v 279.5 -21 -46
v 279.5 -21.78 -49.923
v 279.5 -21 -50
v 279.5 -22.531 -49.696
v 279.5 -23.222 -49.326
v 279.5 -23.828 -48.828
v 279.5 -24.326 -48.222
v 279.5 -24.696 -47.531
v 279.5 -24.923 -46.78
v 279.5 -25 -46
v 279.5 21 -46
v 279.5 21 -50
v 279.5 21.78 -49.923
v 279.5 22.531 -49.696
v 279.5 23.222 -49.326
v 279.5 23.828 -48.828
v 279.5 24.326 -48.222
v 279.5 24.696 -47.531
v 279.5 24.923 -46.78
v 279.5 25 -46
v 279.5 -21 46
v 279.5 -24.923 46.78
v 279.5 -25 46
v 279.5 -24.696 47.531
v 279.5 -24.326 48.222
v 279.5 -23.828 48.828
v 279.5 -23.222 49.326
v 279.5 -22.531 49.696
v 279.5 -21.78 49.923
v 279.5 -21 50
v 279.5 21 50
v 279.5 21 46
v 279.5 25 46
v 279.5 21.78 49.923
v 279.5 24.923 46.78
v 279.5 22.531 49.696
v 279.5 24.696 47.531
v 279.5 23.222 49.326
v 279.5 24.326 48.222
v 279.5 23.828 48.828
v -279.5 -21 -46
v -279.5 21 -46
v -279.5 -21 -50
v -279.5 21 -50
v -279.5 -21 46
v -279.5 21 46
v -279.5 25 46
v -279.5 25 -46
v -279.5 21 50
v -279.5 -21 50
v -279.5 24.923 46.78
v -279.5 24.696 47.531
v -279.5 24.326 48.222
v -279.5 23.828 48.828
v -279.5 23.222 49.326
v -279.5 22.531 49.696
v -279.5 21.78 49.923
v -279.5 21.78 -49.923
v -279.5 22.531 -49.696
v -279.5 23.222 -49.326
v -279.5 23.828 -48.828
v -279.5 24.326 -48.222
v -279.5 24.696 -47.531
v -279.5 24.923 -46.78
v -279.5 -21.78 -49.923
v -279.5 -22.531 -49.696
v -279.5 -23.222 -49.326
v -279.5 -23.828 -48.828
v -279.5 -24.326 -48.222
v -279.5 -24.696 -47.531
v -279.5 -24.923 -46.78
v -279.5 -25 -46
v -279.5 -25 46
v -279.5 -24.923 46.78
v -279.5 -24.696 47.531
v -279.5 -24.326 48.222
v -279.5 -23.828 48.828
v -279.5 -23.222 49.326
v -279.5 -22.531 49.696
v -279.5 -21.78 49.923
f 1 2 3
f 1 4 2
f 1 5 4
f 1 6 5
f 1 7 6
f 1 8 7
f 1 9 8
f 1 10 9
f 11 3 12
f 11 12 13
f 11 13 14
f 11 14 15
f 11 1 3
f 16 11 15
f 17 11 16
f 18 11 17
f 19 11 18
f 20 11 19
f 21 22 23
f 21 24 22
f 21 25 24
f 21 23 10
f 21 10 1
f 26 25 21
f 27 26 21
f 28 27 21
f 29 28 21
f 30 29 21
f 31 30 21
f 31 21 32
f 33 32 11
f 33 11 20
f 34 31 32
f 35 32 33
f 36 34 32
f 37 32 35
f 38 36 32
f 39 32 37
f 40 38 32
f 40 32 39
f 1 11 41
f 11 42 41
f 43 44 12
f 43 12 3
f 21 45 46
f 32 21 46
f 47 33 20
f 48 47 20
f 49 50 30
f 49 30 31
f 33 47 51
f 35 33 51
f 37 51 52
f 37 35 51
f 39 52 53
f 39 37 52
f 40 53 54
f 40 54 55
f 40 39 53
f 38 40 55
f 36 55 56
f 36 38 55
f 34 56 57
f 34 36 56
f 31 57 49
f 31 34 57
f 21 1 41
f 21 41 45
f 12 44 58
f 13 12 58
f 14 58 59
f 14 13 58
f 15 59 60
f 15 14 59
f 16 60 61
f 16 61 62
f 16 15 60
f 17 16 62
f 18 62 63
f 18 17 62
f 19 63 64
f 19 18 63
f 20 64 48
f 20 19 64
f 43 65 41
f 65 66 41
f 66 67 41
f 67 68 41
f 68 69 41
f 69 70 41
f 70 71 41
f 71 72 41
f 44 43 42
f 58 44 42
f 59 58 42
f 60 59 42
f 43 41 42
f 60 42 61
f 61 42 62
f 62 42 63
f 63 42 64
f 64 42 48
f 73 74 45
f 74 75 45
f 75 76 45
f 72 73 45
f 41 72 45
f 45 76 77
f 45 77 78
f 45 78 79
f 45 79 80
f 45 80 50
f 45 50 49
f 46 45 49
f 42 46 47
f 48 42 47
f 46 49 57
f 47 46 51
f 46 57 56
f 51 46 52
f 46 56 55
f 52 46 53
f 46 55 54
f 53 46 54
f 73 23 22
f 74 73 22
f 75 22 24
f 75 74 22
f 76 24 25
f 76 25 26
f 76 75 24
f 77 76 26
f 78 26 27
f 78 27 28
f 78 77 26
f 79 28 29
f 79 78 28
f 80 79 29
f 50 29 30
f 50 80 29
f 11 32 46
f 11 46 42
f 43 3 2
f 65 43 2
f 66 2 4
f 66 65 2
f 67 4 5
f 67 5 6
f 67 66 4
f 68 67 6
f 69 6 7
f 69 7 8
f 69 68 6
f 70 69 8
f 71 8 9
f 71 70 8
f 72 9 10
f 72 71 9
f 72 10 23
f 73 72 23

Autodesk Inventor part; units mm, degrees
ref_plane "YZ Plane" through (0, 0, 0) normal (1, 0, 0) x (0, 1, 0)
ref_plane "XZ Plane" through (0, 0, 0) normal (0, 1, 0) x (-1, 0, 0)
ref_plane "XY Plane" through (0, 0, 0) normal (0, 0, 1) x (1, 0, 0)
sketch "Sketch1" plane through (0, 0, 0) normal (1, 0, 0) x (0, 1, 0)
  line L0 (25, -50) -> (-25, -50)
  line L1 (-25, -50) -> (-25, 50)
  line L2 (-25, 50) -> (25, 50)
  line L3 (25, 50) -> (25, -50)
  line L4 (25, -50) -> (-25, 50) construction
  line L5 (-25, -50) -> (25, 50) construction
  point P0 (0, 0)
  dimension "d0" = 50
  dimension "d1" = 100
extrude "Extrusion1" add sketch "Sketch1" along normal mid plane 559
fillet "Fillet1" radius 4 4 edges at (0, 25, 50) (0, -25, 50) (0, -25, -50) (0, 25, -50)
shell "Shell1" thickness 4 removed faces 2 at (-279.5, -8.3333, -15.3333) at (279.5, -8.3333, -15.3333)
properties part number "MC03-1"
